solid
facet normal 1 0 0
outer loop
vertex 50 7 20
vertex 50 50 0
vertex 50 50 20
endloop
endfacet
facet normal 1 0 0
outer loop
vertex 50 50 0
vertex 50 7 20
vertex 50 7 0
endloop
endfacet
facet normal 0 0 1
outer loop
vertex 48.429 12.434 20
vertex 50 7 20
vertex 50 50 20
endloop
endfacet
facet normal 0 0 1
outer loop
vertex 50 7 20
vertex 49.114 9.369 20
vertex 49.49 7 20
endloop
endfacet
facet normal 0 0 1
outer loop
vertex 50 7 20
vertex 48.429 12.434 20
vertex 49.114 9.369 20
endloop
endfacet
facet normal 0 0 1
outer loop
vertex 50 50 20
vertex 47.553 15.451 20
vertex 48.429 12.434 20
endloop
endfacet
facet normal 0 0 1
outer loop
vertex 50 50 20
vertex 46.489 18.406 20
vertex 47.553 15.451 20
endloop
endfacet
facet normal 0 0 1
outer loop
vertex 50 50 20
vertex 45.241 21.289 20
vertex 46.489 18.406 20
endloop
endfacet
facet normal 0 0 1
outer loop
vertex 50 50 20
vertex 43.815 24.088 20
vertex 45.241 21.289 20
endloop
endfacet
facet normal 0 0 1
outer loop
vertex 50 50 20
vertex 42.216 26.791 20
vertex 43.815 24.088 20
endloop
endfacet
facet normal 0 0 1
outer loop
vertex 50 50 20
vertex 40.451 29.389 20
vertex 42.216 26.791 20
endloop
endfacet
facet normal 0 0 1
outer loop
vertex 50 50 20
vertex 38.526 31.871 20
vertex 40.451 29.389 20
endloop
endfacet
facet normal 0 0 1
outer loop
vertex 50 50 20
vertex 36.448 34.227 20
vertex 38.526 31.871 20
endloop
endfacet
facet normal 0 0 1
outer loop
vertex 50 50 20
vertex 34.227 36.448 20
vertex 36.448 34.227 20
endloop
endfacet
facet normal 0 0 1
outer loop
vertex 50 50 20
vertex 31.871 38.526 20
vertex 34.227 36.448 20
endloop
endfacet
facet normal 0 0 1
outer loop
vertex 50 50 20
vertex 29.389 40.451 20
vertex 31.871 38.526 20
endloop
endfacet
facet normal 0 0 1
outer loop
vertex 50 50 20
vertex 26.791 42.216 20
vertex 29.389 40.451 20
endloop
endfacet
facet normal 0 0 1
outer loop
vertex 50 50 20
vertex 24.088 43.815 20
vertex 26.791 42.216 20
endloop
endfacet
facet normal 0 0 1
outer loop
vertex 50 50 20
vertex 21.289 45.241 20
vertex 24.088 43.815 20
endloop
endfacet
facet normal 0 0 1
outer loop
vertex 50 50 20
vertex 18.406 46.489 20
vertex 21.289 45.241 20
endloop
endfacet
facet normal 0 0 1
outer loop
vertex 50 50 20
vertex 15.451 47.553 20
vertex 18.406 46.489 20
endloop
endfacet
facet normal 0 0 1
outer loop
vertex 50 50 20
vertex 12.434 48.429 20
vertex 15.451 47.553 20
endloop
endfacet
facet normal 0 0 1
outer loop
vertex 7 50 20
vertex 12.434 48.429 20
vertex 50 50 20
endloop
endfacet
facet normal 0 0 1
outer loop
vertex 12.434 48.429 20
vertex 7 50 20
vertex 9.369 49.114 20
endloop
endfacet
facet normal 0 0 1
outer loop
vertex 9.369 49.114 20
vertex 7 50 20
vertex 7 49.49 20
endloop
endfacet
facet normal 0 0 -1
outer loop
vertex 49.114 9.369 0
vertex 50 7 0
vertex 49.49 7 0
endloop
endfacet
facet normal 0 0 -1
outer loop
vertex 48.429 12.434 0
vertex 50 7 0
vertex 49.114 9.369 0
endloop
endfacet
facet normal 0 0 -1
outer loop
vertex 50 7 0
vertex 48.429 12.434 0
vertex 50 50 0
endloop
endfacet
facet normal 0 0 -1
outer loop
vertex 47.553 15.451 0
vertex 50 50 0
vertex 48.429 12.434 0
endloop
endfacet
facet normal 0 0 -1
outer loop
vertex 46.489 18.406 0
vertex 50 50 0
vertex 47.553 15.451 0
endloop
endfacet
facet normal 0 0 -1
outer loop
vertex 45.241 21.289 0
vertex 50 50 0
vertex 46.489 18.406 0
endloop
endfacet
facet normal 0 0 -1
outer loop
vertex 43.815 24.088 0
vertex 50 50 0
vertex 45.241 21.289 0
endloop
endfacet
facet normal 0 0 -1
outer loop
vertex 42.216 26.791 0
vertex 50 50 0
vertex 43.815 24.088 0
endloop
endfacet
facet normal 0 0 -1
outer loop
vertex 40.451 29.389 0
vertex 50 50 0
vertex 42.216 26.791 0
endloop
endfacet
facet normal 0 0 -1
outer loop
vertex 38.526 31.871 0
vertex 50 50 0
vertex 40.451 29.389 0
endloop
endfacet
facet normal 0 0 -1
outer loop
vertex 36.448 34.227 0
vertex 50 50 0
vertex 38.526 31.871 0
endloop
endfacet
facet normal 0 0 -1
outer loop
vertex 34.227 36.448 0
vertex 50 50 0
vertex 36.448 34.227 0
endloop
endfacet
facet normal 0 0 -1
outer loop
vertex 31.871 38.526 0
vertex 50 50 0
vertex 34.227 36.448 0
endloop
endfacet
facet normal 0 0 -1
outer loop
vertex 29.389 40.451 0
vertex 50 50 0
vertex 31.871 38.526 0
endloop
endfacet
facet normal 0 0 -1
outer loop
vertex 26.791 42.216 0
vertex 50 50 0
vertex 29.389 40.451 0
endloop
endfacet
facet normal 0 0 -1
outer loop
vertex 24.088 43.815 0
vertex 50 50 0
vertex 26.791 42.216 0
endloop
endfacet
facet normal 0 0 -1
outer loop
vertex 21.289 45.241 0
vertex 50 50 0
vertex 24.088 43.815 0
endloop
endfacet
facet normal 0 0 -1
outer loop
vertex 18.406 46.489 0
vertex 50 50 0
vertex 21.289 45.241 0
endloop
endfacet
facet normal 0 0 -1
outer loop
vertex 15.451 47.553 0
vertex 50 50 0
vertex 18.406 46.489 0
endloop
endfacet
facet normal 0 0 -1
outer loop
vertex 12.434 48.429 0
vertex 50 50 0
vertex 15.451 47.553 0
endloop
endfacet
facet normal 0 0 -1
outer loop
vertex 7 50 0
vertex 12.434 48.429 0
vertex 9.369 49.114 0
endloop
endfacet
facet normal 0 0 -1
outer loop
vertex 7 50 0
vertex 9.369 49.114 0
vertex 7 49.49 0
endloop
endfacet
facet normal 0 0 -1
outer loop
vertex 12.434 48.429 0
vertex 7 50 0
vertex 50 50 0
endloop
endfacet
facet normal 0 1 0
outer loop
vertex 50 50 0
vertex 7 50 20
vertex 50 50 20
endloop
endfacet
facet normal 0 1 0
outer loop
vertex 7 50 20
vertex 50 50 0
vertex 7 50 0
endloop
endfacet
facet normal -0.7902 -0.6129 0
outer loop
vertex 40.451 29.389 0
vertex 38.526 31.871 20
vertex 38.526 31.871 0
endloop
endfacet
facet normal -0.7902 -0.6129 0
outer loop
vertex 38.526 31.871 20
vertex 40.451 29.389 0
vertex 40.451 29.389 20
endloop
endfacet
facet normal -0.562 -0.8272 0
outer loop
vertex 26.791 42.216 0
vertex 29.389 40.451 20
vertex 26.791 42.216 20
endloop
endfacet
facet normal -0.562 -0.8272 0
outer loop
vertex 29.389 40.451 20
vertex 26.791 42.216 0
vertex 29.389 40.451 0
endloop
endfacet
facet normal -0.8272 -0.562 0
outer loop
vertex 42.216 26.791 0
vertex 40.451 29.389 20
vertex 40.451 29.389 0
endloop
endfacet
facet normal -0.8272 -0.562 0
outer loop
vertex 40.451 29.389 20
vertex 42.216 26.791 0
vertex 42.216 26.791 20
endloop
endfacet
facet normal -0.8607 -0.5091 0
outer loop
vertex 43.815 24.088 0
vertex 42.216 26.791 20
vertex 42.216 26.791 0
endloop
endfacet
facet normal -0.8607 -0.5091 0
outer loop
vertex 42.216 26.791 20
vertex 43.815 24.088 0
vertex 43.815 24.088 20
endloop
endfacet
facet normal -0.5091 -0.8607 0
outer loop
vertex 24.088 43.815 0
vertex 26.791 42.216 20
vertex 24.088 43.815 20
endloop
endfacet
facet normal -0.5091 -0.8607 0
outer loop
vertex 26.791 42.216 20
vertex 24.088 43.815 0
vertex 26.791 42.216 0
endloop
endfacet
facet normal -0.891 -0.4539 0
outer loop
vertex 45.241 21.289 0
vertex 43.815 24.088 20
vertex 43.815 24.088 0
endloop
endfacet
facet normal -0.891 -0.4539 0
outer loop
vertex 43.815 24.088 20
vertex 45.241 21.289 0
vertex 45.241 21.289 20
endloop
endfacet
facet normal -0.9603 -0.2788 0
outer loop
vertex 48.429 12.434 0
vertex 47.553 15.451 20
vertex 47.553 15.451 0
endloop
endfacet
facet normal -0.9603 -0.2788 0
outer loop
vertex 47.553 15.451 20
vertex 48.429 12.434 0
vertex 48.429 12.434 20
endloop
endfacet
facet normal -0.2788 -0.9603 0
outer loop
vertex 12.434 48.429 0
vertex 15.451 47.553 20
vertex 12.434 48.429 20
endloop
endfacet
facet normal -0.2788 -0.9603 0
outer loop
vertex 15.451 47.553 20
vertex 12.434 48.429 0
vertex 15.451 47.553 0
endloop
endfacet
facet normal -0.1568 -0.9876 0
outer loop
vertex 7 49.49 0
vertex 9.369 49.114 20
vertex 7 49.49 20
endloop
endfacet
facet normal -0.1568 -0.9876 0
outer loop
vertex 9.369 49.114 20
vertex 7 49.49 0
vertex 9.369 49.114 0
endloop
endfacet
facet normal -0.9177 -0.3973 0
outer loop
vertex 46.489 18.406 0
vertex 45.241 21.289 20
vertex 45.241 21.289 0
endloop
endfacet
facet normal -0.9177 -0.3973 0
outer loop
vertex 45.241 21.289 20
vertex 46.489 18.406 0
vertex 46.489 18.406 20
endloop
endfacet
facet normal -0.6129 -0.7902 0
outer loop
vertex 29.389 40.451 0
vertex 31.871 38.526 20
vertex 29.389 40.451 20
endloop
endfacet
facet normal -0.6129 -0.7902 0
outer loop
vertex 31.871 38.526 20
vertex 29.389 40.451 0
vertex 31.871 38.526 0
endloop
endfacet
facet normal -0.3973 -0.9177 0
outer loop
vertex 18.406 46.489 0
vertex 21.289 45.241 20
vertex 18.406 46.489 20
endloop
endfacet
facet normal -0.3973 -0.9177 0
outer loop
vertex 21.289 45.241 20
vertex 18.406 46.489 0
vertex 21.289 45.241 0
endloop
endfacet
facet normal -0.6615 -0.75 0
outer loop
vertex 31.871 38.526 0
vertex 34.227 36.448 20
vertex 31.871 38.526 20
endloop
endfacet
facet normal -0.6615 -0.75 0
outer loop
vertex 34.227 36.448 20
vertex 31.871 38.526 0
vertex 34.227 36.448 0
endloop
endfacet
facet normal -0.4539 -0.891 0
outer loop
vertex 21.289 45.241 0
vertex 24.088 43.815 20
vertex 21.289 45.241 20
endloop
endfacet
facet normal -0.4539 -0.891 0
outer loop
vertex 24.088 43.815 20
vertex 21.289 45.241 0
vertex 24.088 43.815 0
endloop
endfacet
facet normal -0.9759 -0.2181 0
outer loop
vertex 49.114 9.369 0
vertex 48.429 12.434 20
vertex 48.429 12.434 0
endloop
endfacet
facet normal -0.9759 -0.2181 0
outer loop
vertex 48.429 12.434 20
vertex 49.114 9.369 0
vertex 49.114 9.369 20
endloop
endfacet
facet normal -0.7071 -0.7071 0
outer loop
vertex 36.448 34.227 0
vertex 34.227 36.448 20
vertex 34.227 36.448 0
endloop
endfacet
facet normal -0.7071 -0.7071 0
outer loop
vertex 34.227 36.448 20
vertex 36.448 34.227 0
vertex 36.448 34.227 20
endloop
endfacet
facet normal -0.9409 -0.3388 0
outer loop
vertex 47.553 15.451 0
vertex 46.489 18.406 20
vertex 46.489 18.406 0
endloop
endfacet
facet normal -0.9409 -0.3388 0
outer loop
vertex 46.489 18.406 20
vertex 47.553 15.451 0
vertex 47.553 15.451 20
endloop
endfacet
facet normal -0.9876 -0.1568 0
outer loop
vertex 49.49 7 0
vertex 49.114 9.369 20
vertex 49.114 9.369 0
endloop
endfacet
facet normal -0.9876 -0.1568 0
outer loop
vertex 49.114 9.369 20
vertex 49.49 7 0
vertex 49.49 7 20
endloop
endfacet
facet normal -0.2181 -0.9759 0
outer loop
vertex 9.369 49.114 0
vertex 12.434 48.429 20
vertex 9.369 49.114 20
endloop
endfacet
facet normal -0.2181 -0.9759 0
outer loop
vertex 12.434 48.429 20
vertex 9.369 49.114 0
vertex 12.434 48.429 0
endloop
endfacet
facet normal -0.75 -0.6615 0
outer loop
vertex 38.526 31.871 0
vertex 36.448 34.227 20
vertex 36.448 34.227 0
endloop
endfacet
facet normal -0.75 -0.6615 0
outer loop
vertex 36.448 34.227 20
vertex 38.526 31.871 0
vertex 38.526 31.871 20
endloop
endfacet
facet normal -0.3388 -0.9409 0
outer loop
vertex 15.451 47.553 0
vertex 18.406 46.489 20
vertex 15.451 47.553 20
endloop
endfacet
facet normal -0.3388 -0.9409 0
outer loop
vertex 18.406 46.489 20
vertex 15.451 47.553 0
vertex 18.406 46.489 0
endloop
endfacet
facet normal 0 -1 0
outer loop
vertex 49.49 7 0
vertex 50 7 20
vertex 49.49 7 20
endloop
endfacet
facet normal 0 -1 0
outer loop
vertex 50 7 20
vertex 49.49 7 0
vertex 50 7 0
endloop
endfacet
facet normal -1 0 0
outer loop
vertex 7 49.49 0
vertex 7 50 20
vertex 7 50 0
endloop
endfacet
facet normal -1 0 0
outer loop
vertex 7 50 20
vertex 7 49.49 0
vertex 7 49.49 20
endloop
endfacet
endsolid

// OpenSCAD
r = 50;
h = 20;
cut_side = 7;

$fn = 100;

difference() {
    cube([r,r,h]);
    cylinder(r=r, h=h);

    translate([r-cut_side/2,0,0])
    cube([cut_side, cut_side, h]);
    
    translate([0, r-cut_side/2,0])
    cube([cut_side, cut_side, h]);
}


module check() {
    cut = 0.5;
    
    translate([r-cut,cut_side-cut-0.3,0])
    cube([cut,cut,h]);
}

//check();
